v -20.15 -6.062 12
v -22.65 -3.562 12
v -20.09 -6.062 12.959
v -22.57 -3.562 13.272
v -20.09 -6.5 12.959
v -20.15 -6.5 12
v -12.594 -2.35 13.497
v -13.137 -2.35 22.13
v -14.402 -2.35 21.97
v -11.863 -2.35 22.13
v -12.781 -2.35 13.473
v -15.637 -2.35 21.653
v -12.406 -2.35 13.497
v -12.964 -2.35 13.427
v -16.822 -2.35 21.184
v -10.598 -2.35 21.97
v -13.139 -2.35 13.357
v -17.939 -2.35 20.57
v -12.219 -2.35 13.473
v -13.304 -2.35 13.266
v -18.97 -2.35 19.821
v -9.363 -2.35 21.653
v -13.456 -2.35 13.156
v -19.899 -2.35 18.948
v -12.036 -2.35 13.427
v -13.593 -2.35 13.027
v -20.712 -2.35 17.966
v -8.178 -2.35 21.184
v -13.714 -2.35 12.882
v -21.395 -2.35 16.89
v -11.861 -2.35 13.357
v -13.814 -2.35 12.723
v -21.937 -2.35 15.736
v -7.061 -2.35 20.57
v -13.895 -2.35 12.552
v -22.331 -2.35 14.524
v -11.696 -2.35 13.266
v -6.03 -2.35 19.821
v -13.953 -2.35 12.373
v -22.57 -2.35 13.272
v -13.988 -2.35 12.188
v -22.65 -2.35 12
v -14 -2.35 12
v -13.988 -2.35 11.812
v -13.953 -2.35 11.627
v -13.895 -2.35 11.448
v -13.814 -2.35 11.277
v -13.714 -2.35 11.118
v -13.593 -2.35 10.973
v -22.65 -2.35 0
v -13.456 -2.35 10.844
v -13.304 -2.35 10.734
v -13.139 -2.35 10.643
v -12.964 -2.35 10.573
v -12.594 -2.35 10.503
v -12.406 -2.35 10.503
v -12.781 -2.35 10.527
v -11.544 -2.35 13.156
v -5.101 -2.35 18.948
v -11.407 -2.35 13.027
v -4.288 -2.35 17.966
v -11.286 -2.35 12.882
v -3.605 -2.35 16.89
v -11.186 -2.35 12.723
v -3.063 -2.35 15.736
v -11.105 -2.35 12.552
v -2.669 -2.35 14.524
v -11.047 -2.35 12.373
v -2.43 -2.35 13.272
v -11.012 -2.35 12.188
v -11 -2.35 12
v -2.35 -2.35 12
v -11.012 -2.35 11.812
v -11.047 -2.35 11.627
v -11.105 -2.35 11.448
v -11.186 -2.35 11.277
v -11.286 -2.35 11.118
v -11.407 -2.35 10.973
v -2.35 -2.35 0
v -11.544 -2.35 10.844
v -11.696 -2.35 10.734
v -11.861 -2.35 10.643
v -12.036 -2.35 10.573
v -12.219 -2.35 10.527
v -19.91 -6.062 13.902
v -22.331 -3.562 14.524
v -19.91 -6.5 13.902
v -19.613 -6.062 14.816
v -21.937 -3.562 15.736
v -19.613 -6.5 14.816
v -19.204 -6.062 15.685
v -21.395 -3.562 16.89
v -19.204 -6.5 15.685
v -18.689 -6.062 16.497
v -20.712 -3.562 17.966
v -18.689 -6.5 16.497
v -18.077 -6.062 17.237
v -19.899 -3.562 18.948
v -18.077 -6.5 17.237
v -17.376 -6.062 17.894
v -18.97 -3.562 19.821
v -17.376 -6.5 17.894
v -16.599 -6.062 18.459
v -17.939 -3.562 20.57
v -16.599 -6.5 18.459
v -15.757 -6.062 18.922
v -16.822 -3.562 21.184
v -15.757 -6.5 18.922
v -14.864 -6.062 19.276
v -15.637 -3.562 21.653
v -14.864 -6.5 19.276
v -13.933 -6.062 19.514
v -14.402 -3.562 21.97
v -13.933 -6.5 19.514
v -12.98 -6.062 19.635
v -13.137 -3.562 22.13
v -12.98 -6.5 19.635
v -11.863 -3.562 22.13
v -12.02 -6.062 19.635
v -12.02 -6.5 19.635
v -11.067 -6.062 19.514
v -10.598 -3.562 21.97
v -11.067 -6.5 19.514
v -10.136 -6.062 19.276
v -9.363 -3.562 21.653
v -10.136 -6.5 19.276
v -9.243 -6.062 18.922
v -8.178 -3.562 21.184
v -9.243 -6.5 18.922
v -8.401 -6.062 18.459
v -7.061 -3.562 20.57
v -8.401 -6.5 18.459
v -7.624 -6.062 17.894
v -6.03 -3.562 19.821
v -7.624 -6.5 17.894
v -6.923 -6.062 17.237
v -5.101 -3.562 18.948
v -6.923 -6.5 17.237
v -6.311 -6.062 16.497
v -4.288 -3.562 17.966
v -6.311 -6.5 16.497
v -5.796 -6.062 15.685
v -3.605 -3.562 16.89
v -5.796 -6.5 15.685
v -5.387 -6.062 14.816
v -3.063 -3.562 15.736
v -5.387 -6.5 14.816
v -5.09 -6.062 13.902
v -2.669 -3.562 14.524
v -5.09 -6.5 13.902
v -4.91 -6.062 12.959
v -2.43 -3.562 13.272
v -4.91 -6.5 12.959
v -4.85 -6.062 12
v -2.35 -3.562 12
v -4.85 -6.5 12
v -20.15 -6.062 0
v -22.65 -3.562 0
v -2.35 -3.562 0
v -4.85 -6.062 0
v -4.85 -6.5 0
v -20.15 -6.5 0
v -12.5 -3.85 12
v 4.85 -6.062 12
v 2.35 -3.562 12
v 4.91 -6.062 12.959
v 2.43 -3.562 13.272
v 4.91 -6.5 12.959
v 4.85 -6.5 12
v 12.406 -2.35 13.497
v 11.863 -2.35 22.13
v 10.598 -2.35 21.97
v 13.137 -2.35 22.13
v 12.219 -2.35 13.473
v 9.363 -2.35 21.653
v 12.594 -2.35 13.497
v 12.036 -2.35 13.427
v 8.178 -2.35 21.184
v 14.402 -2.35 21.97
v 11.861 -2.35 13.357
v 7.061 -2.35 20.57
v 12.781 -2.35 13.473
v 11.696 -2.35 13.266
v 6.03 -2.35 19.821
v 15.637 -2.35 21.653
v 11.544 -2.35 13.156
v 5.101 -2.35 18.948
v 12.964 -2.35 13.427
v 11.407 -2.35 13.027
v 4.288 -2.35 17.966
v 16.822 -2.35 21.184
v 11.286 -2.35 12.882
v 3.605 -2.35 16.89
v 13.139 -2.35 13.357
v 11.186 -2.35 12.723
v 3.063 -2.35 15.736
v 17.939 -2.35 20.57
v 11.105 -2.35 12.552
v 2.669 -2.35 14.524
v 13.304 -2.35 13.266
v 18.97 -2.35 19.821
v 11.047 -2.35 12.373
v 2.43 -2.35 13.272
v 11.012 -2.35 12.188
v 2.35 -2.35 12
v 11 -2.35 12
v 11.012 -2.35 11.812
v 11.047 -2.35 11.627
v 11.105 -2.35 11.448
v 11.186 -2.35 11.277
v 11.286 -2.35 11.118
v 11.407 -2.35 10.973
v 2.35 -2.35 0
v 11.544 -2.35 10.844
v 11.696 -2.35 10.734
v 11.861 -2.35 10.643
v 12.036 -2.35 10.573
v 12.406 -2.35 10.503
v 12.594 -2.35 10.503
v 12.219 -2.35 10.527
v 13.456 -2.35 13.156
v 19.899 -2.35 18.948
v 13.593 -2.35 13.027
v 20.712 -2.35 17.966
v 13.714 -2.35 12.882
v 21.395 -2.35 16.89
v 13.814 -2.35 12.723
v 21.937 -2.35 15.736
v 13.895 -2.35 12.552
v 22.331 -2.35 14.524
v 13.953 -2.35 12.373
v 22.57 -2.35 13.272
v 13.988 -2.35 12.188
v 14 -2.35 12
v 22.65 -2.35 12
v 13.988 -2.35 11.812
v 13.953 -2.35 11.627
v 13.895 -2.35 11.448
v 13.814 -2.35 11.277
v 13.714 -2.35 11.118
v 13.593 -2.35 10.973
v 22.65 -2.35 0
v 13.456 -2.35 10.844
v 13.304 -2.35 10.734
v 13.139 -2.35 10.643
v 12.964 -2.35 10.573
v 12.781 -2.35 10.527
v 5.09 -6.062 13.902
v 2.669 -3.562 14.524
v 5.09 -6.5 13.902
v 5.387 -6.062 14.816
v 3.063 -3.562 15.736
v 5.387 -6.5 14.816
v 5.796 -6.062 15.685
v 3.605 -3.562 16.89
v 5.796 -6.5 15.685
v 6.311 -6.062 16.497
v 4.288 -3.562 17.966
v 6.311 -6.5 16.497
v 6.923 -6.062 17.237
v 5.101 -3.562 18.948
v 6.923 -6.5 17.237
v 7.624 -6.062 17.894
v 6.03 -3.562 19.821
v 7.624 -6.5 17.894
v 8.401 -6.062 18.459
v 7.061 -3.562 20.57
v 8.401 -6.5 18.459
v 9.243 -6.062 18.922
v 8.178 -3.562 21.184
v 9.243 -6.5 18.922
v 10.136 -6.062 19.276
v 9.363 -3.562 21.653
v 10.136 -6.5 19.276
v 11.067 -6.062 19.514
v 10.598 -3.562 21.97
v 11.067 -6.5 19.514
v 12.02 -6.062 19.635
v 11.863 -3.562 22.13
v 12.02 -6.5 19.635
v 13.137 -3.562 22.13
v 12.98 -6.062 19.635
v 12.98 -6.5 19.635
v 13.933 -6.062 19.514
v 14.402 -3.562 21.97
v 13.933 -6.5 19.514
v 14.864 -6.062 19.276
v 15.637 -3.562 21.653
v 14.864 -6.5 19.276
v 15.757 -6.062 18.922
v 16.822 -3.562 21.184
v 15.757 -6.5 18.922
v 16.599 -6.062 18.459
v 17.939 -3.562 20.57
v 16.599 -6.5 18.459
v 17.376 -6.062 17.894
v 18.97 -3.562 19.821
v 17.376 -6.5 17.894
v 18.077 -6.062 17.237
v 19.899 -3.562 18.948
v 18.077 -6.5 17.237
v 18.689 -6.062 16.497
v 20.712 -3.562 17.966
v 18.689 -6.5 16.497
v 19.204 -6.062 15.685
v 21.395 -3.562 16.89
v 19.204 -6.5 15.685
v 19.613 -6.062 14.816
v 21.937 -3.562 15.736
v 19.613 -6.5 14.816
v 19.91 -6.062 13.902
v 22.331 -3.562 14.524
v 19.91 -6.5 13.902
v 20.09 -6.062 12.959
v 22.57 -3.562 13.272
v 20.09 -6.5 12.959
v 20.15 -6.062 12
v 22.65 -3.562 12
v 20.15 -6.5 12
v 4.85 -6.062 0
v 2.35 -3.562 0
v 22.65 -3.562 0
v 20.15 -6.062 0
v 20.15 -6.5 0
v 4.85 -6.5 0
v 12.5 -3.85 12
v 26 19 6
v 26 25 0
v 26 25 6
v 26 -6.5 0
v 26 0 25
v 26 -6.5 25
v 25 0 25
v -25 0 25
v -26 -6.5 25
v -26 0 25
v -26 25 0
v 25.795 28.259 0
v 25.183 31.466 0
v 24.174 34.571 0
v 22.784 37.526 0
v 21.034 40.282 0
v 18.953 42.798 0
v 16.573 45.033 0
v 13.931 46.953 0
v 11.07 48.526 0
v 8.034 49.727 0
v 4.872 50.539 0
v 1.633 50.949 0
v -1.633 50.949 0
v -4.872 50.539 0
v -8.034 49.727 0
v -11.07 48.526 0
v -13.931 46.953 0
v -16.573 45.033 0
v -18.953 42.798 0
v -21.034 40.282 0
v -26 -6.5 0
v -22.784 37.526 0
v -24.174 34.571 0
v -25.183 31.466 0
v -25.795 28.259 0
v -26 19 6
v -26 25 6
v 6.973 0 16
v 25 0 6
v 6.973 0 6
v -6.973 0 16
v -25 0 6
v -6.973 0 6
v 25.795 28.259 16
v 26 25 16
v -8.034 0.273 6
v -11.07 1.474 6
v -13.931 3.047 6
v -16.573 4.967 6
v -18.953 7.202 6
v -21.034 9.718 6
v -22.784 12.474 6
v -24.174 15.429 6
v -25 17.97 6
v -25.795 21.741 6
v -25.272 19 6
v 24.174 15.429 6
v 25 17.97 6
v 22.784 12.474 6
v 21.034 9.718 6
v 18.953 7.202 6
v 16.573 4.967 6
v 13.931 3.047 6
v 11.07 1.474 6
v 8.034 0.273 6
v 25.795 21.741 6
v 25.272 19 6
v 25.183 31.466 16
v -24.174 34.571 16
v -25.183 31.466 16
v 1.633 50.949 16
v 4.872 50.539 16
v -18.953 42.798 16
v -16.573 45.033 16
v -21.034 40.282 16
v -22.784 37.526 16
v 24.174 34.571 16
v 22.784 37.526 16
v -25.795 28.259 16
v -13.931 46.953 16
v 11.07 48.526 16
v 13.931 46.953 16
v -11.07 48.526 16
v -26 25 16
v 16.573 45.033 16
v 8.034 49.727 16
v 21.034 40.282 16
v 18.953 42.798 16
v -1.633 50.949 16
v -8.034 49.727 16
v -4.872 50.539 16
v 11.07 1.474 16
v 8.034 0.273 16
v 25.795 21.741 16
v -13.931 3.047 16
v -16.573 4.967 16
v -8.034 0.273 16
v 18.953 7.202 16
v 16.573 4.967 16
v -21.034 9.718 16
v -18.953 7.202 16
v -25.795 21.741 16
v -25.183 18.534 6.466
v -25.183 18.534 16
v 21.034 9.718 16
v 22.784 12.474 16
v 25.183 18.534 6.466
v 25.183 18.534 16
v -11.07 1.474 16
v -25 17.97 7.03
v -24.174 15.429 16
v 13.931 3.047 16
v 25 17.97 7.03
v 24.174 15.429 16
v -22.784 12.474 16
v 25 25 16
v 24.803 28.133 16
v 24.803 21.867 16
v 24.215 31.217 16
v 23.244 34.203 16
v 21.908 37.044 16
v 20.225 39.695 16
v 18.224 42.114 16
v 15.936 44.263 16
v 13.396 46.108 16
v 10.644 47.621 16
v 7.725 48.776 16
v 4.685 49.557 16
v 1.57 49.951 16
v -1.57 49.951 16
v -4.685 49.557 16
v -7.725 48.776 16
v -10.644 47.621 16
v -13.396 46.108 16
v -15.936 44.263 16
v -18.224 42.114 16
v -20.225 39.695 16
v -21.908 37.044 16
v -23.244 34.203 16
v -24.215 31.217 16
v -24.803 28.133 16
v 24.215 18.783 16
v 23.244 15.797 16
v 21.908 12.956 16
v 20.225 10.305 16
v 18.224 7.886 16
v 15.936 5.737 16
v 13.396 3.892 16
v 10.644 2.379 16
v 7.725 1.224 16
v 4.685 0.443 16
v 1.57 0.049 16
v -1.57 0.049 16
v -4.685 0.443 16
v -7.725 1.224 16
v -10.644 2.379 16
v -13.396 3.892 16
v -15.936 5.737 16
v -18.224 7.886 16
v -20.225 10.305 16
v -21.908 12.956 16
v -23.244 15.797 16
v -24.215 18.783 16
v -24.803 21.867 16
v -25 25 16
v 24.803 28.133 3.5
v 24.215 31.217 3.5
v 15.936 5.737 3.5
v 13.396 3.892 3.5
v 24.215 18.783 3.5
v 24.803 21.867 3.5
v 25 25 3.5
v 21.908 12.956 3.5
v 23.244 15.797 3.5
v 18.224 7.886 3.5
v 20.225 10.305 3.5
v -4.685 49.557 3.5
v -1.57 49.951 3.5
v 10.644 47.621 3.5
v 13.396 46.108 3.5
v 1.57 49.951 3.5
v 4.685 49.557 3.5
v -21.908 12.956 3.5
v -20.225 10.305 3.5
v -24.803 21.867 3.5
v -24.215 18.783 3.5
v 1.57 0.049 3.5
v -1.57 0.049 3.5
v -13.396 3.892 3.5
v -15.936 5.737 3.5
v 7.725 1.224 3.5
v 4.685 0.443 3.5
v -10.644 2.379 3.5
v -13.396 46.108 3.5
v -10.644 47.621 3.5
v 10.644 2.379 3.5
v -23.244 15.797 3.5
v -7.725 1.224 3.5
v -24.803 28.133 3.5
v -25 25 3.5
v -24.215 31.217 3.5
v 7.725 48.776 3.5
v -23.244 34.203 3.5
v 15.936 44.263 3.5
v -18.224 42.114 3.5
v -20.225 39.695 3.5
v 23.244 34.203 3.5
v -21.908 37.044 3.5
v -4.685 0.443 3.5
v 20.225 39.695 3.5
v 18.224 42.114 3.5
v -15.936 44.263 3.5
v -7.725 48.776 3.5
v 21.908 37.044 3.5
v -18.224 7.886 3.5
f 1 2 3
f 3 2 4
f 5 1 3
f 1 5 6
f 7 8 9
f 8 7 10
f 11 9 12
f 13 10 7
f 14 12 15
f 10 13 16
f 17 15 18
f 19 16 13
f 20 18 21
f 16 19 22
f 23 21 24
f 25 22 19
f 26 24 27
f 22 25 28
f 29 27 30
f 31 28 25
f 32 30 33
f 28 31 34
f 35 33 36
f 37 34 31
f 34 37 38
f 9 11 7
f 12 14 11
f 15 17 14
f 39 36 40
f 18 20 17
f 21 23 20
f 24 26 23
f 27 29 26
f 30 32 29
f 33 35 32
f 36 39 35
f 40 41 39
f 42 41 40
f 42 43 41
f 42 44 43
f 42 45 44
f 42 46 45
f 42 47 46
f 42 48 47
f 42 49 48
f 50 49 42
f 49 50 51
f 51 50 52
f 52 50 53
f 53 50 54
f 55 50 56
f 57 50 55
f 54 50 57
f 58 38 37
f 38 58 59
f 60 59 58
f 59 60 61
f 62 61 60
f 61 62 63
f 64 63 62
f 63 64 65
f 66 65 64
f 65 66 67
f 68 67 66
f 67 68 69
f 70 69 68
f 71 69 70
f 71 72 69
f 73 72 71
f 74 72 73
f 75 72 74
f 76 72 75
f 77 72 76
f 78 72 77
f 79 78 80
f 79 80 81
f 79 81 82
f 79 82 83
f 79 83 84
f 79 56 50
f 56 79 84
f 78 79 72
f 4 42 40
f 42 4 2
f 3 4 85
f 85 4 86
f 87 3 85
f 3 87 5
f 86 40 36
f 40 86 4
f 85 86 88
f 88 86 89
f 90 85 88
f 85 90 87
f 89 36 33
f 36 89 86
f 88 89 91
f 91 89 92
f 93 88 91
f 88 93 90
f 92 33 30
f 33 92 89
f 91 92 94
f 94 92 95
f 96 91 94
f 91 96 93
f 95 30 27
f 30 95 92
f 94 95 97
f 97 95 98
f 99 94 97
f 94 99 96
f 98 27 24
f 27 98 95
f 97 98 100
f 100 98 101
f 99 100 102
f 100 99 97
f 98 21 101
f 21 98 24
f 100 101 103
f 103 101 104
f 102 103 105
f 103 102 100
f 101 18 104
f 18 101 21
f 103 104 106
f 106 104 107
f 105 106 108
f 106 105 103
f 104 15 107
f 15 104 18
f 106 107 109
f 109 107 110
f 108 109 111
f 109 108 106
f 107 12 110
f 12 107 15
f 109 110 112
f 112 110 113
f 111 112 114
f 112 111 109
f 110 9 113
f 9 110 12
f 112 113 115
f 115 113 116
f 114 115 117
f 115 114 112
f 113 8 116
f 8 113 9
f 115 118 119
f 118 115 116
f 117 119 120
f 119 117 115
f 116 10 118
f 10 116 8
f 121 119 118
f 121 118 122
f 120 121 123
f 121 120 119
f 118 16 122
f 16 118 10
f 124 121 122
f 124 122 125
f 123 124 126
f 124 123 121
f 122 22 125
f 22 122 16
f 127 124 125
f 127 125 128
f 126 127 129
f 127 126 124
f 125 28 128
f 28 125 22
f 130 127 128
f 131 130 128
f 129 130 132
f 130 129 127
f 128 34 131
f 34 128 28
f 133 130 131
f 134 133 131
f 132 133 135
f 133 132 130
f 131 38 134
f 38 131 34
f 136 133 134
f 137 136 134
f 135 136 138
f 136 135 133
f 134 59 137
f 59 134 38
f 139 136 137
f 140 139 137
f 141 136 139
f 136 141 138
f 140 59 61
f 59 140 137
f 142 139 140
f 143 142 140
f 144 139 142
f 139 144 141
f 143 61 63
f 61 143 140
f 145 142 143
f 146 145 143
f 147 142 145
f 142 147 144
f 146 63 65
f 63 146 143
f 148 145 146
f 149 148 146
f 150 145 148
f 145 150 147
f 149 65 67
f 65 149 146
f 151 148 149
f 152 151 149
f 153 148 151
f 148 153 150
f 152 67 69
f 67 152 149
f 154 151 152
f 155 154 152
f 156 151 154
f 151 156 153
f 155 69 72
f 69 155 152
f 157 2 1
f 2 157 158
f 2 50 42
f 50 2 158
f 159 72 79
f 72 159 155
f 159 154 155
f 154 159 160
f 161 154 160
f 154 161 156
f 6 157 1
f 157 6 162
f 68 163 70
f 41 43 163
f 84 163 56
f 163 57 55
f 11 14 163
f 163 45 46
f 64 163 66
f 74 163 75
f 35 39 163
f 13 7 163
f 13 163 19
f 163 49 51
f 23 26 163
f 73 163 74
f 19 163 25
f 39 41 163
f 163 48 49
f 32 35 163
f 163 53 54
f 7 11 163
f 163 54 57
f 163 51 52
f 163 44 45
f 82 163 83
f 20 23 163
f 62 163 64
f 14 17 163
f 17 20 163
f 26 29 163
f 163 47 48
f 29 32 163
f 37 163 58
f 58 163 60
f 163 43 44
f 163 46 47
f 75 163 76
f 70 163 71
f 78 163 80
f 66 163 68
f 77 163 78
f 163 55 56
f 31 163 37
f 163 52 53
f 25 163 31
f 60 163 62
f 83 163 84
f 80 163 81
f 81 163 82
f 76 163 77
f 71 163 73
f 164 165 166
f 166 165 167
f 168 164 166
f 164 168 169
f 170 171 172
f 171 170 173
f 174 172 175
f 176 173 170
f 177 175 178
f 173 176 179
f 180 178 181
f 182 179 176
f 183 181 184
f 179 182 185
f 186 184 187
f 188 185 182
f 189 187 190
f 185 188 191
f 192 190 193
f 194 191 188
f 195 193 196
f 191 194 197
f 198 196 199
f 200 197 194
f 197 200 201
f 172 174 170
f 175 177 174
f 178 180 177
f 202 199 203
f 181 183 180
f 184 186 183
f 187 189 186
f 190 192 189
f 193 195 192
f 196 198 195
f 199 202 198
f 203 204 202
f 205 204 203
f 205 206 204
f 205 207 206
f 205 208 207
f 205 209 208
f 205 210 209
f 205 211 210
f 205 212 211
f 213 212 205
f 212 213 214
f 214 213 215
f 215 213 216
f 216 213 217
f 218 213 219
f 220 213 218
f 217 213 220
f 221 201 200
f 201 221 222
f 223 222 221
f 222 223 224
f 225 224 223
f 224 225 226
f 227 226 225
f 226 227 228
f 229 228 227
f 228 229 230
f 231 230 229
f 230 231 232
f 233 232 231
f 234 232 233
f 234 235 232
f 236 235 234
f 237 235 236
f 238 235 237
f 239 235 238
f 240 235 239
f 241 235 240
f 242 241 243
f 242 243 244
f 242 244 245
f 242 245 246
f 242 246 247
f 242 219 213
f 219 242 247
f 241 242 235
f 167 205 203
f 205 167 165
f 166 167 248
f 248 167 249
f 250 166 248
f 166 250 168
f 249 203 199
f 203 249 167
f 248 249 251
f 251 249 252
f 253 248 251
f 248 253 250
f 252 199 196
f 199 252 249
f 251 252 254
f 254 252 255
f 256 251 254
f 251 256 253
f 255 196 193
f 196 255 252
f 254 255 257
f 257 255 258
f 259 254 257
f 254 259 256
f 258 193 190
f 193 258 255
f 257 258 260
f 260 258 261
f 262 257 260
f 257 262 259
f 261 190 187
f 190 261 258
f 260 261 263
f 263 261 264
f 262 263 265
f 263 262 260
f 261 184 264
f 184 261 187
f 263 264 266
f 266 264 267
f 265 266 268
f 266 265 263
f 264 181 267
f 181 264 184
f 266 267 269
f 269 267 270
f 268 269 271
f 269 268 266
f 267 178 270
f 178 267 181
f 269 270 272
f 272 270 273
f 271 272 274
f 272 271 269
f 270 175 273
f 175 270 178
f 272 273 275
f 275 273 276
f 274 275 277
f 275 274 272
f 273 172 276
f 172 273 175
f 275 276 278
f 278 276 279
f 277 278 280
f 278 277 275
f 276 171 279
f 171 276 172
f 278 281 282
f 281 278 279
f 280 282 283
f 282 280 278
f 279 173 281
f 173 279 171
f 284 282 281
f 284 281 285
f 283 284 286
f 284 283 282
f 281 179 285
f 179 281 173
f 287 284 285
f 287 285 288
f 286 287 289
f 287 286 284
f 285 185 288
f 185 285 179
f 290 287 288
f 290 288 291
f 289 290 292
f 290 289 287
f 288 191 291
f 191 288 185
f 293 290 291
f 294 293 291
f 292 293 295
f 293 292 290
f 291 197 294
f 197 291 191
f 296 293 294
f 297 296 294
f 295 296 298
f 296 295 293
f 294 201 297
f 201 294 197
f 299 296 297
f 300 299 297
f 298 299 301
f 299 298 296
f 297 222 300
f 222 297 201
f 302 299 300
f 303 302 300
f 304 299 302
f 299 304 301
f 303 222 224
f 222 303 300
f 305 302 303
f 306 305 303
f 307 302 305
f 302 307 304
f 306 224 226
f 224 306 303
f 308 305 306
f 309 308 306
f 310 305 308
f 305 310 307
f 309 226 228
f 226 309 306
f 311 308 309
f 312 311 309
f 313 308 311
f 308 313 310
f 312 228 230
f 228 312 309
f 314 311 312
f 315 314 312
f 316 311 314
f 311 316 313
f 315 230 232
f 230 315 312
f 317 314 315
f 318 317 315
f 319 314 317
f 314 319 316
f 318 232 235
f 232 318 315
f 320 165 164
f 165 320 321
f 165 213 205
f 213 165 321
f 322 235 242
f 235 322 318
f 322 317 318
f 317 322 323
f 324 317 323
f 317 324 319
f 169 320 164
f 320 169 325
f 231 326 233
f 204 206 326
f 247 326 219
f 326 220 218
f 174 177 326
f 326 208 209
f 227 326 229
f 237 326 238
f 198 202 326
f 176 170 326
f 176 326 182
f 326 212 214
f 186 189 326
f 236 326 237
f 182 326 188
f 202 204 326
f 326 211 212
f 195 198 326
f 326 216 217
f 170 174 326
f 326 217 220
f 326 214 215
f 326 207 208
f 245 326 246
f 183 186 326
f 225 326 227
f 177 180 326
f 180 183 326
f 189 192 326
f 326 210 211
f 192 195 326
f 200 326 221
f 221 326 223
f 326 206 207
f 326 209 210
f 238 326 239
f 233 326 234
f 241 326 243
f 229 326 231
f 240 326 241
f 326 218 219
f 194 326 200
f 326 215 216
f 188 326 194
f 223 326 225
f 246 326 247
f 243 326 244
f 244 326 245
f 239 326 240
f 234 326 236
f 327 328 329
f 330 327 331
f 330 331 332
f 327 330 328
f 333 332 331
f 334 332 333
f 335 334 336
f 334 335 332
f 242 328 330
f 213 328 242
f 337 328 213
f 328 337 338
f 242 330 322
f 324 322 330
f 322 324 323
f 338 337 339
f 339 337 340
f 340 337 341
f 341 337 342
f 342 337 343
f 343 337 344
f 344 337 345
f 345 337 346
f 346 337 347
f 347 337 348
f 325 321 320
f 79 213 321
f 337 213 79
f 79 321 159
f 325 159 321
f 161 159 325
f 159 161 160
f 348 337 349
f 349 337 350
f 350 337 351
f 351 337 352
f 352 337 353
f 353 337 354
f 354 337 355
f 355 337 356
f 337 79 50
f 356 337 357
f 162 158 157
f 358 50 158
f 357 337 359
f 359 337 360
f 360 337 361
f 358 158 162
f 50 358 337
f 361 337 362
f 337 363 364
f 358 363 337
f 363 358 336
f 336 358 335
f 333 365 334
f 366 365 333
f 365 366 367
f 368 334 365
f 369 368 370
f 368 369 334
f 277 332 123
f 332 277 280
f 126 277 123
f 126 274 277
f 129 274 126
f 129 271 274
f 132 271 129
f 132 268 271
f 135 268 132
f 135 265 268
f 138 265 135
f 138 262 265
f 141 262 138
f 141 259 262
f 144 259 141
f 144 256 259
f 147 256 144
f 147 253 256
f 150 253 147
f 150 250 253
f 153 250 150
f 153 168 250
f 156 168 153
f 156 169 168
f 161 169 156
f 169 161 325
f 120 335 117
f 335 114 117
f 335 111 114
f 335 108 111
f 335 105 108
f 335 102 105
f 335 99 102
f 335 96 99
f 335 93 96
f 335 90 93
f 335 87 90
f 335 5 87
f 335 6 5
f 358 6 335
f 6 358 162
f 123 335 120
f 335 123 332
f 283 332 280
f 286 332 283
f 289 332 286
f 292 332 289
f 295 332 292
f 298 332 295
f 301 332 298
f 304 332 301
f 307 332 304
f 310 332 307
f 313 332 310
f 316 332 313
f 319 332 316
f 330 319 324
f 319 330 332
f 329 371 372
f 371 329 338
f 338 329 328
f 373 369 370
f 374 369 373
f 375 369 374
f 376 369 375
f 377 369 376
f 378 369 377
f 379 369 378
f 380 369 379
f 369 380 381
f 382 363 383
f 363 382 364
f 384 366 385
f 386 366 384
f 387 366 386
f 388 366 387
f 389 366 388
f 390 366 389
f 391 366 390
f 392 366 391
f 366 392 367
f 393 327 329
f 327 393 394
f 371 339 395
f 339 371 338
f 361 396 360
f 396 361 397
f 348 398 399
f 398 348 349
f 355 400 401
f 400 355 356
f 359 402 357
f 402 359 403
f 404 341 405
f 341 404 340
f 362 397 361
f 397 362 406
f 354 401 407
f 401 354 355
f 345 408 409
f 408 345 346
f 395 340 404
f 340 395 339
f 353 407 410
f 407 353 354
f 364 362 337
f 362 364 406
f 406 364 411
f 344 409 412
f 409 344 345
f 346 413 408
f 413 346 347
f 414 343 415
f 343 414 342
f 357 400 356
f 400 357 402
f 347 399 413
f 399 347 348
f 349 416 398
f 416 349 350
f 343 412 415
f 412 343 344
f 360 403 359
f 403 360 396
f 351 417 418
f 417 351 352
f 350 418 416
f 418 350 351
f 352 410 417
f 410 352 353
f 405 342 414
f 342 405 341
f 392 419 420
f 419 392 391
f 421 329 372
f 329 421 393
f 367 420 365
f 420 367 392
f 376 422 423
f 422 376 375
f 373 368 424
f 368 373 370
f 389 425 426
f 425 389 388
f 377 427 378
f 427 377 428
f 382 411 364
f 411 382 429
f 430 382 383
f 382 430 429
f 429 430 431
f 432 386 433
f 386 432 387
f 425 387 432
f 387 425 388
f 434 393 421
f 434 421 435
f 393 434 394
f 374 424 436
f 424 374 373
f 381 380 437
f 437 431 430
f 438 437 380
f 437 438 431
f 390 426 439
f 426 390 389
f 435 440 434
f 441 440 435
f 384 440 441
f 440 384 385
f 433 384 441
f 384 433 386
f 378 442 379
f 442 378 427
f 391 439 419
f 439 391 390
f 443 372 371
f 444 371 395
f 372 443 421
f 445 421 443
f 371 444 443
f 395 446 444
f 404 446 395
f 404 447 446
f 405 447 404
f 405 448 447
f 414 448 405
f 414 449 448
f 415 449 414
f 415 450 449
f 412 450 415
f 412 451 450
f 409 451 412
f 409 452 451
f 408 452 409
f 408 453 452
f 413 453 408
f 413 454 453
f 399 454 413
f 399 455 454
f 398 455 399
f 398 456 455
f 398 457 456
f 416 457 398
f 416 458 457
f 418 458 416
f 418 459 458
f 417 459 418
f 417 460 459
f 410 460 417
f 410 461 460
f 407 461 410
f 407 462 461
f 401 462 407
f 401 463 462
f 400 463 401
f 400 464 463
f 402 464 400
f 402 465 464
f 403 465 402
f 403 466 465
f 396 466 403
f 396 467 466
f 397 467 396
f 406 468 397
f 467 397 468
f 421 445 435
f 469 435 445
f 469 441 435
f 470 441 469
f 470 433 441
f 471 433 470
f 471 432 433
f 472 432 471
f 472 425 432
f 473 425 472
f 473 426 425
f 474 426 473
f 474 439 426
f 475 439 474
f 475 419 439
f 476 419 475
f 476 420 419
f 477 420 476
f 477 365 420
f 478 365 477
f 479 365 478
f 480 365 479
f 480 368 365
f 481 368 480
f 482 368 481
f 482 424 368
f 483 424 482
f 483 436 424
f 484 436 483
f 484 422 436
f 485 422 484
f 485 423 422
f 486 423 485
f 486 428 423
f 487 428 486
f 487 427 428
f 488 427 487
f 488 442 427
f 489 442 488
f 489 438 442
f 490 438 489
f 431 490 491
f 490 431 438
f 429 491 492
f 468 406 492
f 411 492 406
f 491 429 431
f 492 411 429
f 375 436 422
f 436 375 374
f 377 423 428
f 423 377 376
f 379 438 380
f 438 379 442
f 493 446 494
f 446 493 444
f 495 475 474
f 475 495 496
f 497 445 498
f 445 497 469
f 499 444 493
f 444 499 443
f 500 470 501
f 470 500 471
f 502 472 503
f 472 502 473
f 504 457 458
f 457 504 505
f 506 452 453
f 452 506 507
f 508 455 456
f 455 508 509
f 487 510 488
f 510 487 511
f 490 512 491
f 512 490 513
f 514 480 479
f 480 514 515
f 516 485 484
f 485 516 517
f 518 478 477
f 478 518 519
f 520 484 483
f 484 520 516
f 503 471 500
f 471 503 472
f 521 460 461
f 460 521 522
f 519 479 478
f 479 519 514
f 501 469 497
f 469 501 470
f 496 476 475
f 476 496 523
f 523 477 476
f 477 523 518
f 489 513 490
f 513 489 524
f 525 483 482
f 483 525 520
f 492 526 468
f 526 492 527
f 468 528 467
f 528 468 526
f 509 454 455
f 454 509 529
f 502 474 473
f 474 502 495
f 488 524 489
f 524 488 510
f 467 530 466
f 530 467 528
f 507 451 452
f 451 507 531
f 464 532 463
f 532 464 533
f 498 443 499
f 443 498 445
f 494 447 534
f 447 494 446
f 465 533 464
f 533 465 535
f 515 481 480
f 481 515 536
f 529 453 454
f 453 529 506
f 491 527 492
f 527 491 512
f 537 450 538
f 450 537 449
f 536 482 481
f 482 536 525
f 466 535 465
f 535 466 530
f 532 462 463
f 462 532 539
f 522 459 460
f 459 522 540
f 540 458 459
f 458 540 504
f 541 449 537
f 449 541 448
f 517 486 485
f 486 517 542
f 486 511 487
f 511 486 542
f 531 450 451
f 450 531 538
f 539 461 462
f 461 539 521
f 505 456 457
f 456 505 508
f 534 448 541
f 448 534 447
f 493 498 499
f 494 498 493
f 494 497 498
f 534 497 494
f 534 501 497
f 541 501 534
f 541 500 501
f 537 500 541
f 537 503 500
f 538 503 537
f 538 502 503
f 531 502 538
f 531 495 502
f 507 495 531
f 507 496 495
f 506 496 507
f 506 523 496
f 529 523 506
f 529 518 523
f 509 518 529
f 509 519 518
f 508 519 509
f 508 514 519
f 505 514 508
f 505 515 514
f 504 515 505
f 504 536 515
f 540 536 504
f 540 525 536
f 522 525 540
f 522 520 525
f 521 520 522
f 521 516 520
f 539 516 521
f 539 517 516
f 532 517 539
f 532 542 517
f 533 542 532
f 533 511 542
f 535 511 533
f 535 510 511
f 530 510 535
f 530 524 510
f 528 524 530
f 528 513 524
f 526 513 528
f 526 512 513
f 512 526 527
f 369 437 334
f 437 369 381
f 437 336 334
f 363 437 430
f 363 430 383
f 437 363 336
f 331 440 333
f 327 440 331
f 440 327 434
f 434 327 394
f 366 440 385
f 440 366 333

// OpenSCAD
/*Created by Andy Levesque
Credit to @David D on Printables and Jonathan at Keep Making for Multiconnect and Multiboard, respectively
Licensed Creative Commons 4.0 Attribution Non-Commercial Sharable with Attribution
*/

/*[Parameters]*/
//diameter (in mm) of the item you wish to insert (this becomes the internal diameter)
itemDiameter = 50; //0.1
//thickness (in mm) of the wall surrounding the item
rimThickness = 1;
//Thickness (in mm) of the base underneath the item you are holding
baseThickness = 3;
//Additional thickness of the area between the item holding and the backer.
shelfSupportHeight = 3;
//Additional height (in mm) of the rim protruding upward to hold the item
rimHeight = 10;
//Additional Backer Height (in mm) in case you prefer additional support for something heavy
additionalBackerHeight = 0;
//Offset the holding position from the back wall
offSet = 0;
//Use cutout for holding items that are wider at the top
useCutout = false;

/*[Slot Customization]*/
//Distance between Multiconnect slots on the back (25mm is standard for MultiBoard)
distanceBetweenSlots = 25;
//QuickRelease removes the small indent in the top of the slots that lock the part into place
slotQuickRelease = false;
//Dimple scale tweaks the size of the dimple in the slot for printers that need a larger dimple to print correctly
dimpleScale = 1; //[0.5:.05:1.5]
//Scale the size of slots in the back (1.015 scale is default for a tight fit. Increase if your finding poor fit. )
slotTolerance = 1.00; //[0.925:0.005:1.075]
//Move the slot in (positive) or out (negative)
slotDepthMicroadjustment = 0; //[-.5:0.05:.5]
//enable a slot on-ramp for easy mounting of tall items
onRampEnabled = true;
//frequency of slots for on-ramp. 1 = every slot; 2 = every 2 slots; etc.
onRampEveryXSlots = 1;


/*[Hidden]*/
totalWidth = itemDiameter + rimThickness*2;
totalHeight = max(baseThickness+shelfSupportHeight+0.25*itemDiameter,25);

//start build
translate(v = [-max(totalWidth,distanceBetweenSlots)/2,0,0]) 
    multiconnectBack(backWidth = totalWidth, backHeight = totalHeight+additionalBackerHeight, distanceBetweenSlots = distanceBetweenSlots);
    //item holder
translate(v = [-totalWidth/2,0,0]) 
union() {
    difference() {
        //itemwalls
        union() {
            hull(){
                translate(v = [totalWidth/2,itemDiameter/2+offSet,0]) 
                    //outer circle
                    linear_extrude(height = shelfSupportHeight+baseThickness) 
                            circle(r = itemDiameter/2+rimThickness, $fn=50);
                    //wide back for hull operation
                    linear_extrude(height = shelfSupportHeight+baseThickness) 
                            square(size = [totalWidth,1]);
                }
            //thin holding wall
            translate(v = [totalWidth/2,itemDiameter/2+offSet,shelfSupportHeight+baseThickness]) 
                linear_extrude(height = rimHeight) 
                    circle(r = itemDiameter/2+rimThickness, $fn=50);
        }
        //itemDiameter (i.e., delete tool)
        translate(v = [totalWidth/2,(itemDiameter/2)+offSet,baseThickness+.5 - (useCutout?+(baseThickness*2)+1:0)]) linear_extrude(height = shelfSupportHeight+rimHeight+1+(useCutout?+(baseThickness*2):0)) circle(r = itemDiameter/2, $fn=50);
    }
    //brackets
    bracketSize = min(totalHeight-baseThickness-shelfSupportHeight, itemDiameter/2);
    translate(v = [rimThickness,0,bracketSize+baseThickness+shelfSupportHeight]) shelfBracket(bracketHeight = bracketSize, bracketDepth = bracketSize, rimThickness = rimThickness);
    translate(v = [rimThickness*2+itemDiameter,0,bracketSize+baseThickness+shelfSupportHeight]) shelfBracket(bracketHeight = bracketSize, bracketDepth = bracketSize, rimThickness = rimThickness);
}

//BEGIN MODULES
//Slotted back Module
module multiconnectBack(backWidth, backHeight, distanceBetweenSlots)
{
    //slot count calculates how many slots can fit on the back. Based on internal width for buffer. 
    //slot width needs to be at least the distance between slot for at least 1 slot to generate
    let (backWidth = max(backWidth,distanceBetweenSlots), backHeight = max(backHeight, 25),slotCount = floor(backWidth/distanceBetweenSlots), backThickness = 6.5){
        difference() {
            translate(v = [0,-backThickness,0]) cube(size = [backWidth,backThickness,backHeight]);
            //Loop through slots and center on the item
            //Note: I kept doing math until it looked right. It's possible this can be simplified.
            for (slotNum = [0:1:slotCount-1]) {
                translate(v = [distanceBetweenSlots/2+(backWidth/distanceBetweenSlots-slotCount)*distanceBetweenSlots/2+slotNum*distanceBetweenSlots,-2.35+slotDepthMicroadjustment,backHeight-13]) {
                    slotTool(backHeight);
                }
            }
        }
    }
    //Create Slot Tool
    module slotTool(totalHeight) {
        scale(v = slotTolerance)
        //slot minus optional dimple with optional on-ramp
        let (slotProfile = [[0,0],[10.15,0],[10.15,1.2121],[7.65,3.712],[7.65,5],[0,5]])
        difference() {
            union() {
                //round top
                rotate(a = [90,0,0,]) 
                    rotate_extrude($fn=50) 
                        polygon(points = slotProfile);
                //long slot
                translate(v = [0,0,0]) 
                    rotate(a = [180,0,0]) 
                    linear_extrude(height = totalHeight+1) 
                        union(){
                            polygon(points = slotProfile);
                            mirror([1,0,0])
                                polygon(points = slotProfile);
                        }
                //on-ramp
                if(onRampEnabled)
                    for(y = [1:onRampEveryXSlots:totalHeight/distanceBetweenSlots])
                        translate(v = [0,-5,-y*distanceBetweenSlots]) 
                            rotate(a = [-90,0,0]) 
                                cylinder(h = 5, r1 = 12, r2 = 10.15);
            }
            //dimple
            if (slotQuickRelease == false)
                scale(v = dimpleScale) 
                rotate(a = [90,0,0,]) 
                    rotate_extrude($fn=50) 
                        polygon(points = [[0,0],[0,1.5],[1.5,0]]);
        }
    }
}

module shelfBracket(bracketHeight, bracketDepth, rimThickness){
        rotate(a = [-90,0,90]) 
            linear_extrude(height = rimThickness) 
                polygon([[0,0],[0,bracketHeight],[bracketDepth,bracketHeight]]);
}
